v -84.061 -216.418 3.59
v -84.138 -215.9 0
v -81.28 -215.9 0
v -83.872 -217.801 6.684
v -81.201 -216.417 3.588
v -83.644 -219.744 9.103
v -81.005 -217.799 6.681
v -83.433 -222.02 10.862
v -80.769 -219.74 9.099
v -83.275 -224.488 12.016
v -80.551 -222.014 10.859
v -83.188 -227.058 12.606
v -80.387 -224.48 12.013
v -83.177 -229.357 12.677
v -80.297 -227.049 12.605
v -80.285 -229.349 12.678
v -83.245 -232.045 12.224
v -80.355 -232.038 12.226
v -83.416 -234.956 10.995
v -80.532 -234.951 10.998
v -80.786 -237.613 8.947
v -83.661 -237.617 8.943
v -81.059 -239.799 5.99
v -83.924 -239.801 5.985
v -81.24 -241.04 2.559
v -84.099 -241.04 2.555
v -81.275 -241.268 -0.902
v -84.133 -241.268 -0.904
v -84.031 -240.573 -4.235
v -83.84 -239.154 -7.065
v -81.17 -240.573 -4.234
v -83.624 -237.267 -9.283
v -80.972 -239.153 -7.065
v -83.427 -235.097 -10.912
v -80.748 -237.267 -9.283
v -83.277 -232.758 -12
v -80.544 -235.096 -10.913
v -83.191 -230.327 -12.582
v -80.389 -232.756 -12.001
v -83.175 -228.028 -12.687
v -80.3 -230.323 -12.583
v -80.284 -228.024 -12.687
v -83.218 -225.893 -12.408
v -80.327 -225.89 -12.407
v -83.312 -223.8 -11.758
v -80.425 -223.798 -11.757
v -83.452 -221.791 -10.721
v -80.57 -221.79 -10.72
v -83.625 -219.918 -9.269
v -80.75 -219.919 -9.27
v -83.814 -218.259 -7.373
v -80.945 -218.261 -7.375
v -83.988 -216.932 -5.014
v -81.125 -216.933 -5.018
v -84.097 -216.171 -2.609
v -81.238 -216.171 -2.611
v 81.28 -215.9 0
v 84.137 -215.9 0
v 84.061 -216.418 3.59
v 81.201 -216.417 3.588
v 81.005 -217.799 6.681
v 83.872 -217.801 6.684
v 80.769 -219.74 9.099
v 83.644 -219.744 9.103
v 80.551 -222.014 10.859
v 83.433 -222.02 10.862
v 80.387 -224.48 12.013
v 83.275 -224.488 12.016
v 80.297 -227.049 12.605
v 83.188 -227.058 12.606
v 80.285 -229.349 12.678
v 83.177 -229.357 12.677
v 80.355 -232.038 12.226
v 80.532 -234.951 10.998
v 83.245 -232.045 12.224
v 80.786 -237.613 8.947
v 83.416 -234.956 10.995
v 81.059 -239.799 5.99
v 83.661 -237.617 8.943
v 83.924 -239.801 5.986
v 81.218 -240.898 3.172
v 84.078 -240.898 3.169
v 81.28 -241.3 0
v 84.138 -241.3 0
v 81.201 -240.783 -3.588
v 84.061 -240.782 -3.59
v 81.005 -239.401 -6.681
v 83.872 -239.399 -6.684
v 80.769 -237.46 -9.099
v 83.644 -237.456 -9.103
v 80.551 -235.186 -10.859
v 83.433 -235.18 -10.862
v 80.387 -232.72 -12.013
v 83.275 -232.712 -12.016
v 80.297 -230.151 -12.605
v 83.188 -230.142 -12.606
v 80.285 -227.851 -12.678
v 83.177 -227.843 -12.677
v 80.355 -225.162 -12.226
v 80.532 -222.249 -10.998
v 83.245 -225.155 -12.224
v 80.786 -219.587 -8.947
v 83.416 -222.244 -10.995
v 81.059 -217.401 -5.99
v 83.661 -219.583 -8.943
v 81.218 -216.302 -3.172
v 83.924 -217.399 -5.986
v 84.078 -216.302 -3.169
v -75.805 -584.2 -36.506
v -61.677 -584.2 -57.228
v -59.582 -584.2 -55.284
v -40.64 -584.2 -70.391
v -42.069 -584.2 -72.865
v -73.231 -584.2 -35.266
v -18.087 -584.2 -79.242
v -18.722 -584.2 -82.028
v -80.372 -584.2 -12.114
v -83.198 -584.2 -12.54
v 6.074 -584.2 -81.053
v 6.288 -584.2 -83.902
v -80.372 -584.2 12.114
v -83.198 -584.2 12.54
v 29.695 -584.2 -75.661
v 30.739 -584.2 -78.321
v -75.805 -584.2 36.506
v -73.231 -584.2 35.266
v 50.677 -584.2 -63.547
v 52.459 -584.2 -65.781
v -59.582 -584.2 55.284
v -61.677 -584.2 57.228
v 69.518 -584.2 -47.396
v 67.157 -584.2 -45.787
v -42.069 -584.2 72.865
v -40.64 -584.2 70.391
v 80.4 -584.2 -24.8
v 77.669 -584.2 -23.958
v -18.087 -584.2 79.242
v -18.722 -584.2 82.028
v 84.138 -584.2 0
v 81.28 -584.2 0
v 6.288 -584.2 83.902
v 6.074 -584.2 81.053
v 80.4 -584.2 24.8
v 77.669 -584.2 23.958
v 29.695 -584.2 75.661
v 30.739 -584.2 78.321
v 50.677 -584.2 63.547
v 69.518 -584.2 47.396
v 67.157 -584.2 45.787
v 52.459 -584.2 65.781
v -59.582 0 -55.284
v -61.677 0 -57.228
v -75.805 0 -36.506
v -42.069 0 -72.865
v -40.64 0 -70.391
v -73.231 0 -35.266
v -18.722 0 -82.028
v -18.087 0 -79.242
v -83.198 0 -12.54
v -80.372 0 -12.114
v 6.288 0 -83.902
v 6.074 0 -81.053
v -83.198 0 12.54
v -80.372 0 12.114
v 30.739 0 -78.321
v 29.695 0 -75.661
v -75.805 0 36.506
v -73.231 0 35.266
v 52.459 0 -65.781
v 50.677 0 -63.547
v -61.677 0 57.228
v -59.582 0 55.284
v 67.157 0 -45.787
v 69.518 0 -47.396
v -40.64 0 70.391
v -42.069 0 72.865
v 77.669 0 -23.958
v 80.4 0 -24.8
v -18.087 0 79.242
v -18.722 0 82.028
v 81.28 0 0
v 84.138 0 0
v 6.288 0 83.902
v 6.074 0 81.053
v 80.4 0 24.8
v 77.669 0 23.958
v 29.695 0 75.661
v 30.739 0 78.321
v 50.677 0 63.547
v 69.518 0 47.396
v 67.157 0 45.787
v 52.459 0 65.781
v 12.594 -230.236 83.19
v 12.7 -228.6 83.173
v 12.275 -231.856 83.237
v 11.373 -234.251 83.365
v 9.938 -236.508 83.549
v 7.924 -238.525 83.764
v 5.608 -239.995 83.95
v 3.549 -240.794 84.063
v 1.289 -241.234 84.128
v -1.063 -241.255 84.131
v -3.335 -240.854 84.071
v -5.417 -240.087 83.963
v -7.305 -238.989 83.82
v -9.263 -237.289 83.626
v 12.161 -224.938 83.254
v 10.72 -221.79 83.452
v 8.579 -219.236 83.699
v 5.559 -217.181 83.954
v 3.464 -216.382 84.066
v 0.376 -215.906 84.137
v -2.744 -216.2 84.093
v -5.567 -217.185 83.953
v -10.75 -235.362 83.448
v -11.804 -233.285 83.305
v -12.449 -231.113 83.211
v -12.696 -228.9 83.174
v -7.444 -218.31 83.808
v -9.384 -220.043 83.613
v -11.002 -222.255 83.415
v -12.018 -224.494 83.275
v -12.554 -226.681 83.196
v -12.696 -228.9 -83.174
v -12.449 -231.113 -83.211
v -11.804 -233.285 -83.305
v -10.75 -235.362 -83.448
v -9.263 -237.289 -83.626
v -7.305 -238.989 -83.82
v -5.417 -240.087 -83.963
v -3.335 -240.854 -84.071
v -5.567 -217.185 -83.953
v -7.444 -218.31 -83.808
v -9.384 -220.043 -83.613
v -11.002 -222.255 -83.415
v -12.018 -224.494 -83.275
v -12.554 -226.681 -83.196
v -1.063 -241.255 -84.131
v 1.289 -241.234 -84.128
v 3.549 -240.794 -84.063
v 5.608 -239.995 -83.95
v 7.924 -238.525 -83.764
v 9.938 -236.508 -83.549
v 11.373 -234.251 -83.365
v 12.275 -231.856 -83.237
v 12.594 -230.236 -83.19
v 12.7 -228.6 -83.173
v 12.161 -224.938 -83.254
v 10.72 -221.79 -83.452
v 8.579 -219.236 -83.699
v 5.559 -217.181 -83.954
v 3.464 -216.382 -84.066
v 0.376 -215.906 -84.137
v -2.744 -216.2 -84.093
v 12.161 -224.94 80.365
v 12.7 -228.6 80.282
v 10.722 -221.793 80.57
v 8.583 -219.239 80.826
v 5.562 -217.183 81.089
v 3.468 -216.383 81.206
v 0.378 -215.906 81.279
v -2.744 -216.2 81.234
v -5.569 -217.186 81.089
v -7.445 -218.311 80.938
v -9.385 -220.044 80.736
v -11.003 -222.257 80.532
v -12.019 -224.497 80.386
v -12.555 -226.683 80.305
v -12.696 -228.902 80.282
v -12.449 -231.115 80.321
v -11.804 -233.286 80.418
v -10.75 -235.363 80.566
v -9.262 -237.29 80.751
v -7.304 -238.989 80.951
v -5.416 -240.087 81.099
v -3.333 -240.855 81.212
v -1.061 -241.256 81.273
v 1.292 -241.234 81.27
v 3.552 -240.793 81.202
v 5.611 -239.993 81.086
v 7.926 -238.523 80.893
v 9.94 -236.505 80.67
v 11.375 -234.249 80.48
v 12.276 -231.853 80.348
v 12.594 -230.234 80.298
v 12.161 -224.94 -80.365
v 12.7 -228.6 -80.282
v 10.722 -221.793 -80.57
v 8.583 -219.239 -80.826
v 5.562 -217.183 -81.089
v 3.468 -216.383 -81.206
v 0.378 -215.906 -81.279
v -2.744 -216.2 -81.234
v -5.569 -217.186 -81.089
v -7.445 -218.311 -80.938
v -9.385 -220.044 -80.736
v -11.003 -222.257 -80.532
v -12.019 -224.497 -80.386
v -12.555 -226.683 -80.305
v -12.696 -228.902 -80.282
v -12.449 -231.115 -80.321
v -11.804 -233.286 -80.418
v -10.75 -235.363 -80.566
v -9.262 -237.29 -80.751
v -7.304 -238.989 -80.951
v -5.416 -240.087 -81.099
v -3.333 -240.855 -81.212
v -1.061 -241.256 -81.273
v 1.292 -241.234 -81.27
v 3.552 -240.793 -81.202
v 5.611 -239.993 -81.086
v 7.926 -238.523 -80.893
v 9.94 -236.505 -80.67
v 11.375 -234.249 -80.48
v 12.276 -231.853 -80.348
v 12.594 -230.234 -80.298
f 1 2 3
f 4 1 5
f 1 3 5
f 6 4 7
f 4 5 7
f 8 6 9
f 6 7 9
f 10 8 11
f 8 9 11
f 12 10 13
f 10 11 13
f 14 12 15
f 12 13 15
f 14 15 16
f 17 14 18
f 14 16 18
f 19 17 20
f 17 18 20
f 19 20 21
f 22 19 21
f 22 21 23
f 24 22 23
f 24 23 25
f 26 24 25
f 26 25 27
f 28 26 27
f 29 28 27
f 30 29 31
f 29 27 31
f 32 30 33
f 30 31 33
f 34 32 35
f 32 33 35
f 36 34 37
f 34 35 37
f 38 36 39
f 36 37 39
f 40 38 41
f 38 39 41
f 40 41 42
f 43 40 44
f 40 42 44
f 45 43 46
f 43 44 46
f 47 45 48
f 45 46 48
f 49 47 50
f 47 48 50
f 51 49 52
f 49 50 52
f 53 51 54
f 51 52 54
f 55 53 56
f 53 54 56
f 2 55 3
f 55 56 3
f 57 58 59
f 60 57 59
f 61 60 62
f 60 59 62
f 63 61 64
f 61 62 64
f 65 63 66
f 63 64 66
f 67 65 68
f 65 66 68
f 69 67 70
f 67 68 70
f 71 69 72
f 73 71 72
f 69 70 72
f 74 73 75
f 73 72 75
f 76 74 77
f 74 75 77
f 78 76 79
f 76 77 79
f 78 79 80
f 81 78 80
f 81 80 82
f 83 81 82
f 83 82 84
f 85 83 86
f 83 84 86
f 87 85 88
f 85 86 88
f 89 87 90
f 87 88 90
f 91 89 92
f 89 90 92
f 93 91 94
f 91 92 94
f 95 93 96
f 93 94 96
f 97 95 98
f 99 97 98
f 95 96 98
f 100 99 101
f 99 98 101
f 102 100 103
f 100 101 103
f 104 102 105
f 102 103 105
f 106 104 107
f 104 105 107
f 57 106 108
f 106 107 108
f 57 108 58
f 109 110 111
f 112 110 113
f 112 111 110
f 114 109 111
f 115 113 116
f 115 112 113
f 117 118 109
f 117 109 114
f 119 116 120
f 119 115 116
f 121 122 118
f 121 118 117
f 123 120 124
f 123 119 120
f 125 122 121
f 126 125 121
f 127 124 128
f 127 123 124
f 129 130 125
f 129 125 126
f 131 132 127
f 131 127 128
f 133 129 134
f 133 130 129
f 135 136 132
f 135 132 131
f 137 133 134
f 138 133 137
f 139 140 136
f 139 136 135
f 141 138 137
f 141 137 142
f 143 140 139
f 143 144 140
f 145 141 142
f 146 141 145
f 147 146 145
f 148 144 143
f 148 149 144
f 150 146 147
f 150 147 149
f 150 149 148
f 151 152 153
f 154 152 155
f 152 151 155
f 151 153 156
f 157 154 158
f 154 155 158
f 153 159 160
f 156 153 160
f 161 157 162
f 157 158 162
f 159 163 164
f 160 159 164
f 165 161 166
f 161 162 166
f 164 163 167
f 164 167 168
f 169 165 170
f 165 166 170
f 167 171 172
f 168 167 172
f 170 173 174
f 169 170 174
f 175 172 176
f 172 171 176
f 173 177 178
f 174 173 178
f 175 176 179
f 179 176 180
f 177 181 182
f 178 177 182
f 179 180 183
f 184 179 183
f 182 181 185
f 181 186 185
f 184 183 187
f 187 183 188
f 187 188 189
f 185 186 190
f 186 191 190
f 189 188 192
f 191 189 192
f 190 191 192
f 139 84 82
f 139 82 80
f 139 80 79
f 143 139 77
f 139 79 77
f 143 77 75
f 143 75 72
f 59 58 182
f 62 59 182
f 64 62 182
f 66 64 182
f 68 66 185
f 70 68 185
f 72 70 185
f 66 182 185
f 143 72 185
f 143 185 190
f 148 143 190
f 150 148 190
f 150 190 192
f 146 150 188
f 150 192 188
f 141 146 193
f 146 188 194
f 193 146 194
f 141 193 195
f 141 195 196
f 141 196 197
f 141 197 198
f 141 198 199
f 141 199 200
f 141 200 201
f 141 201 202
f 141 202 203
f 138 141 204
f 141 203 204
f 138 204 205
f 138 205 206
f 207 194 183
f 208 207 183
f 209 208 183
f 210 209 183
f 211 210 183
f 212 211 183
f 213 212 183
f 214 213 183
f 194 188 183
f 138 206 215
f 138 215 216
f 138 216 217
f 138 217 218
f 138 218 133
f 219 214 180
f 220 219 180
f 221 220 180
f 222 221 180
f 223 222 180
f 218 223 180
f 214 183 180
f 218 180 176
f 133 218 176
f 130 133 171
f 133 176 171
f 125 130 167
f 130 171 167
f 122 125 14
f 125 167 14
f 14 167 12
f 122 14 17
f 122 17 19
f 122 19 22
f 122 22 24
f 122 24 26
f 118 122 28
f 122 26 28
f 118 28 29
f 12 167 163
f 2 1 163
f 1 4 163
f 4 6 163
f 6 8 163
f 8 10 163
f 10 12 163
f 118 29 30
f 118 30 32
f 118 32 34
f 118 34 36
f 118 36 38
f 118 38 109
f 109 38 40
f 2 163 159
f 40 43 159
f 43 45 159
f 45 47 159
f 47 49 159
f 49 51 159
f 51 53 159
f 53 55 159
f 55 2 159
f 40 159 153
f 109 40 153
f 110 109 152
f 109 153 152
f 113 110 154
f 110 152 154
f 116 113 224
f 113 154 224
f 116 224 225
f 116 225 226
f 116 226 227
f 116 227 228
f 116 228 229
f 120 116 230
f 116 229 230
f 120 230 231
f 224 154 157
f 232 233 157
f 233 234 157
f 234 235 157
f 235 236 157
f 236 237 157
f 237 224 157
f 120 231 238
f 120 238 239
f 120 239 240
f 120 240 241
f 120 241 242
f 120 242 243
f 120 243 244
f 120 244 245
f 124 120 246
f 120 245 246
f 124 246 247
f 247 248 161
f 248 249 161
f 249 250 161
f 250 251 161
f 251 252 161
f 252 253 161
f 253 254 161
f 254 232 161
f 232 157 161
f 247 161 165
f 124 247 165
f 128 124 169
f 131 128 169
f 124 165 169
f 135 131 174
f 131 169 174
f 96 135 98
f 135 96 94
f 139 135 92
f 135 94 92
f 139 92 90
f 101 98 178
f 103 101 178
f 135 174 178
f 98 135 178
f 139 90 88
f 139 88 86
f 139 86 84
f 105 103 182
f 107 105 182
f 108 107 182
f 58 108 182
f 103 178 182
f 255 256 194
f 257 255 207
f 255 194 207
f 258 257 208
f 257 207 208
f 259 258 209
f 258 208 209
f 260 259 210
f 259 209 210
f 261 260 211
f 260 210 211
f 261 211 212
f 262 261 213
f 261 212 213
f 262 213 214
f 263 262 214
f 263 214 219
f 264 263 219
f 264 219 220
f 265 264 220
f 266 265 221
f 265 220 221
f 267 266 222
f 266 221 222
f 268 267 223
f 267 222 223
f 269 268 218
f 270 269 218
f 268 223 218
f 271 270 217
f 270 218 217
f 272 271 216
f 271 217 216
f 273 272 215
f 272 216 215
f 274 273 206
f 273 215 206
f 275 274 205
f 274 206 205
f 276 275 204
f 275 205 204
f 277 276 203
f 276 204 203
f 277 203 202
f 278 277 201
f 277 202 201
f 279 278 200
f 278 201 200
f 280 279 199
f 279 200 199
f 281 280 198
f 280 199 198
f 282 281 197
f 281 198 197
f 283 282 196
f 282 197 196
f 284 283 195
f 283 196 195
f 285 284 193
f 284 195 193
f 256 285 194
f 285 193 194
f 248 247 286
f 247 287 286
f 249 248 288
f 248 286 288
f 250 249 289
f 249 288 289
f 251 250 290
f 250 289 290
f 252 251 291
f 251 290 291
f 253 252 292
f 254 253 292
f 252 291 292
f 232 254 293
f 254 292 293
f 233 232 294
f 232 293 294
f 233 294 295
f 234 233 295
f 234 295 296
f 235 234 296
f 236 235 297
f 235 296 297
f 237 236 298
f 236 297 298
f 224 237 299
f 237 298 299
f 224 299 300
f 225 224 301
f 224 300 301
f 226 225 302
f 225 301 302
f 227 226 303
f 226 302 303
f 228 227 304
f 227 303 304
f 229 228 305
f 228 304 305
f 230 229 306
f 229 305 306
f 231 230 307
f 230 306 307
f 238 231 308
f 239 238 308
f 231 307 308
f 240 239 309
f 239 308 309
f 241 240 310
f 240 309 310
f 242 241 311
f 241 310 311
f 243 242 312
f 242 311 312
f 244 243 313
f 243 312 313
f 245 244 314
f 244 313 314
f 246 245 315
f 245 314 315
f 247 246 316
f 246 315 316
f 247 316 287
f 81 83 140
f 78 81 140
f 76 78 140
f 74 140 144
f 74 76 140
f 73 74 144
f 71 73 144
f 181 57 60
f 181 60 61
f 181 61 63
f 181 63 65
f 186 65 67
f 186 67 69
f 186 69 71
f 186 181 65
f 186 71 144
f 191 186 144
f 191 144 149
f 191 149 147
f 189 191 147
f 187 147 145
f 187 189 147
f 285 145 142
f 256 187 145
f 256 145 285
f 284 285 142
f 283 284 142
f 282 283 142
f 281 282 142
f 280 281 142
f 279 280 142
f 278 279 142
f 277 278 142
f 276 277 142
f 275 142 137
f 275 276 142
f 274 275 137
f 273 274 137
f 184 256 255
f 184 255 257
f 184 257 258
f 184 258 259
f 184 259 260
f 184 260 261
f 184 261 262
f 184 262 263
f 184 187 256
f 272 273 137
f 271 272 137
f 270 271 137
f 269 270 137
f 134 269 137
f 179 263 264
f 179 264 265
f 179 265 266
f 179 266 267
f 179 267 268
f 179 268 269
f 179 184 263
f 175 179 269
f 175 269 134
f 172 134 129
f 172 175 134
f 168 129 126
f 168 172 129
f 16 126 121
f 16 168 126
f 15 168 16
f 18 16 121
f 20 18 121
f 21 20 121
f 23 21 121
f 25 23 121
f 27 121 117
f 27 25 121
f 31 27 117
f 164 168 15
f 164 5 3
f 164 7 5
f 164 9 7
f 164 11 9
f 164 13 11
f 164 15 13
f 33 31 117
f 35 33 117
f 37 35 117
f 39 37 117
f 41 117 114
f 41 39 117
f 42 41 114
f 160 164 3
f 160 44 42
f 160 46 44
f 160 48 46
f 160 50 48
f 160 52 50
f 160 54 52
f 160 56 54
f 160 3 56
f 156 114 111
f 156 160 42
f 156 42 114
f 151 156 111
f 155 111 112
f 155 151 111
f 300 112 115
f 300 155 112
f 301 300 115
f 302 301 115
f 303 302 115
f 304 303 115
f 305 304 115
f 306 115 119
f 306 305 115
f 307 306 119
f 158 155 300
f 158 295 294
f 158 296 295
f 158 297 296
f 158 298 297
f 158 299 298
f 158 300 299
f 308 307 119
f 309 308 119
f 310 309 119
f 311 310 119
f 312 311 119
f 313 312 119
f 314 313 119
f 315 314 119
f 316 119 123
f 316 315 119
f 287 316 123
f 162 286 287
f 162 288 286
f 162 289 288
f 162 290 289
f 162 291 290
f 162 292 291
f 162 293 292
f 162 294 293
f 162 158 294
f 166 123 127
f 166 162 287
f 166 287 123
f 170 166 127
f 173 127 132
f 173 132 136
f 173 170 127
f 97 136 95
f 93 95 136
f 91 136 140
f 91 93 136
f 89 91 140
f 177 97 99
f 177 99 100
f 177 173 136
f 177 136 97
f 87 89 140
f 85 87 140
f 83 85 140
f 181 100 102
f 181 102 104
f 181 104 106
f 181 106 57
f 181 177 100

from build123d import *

# Parameters (mm, degrees)
F0_R     = 84.1375
F0_R_2   = 81.28
F1_DEPTH = 457.2
F2_R     = 12.7
F3_DEPTH = 127
F4_R     = 12.7
F5_DEPTH = 127
F6_R     = 84.1375
F6_R_2   = 81.28
F7_DEPTH = 127


with BuildPart() as f1:
    # F0 (on Front) → F1 (new body)
    with BuildSketch(Plane.XZ):
        Circle(F0_R)
        Circle(F0_R_2, mode=Mode.SUBTRACT)
    extrude(amount=F1_DEPTH)

    # F2 (on Right) → F3 (cut, symmetric)
    with BuildSketch(Plane.YZ):
        with Locations((-228.6, 0)):
            Circle(F2_R)
    extrude(amount=F3_DEPTH, both=True, mode=Mode.SUBTRACT)

    # F4 (on Top) → F5 (cut, symmetric)
    with BuildSketch(Plane.XY):
        with Locations((0, -228.6)):
            Circle(F4_R)
    extrude(amount=F5_DEPTH, both=True, mode=Mode.SUBTRACT)

    # F6 (on face) → F7 (join)
    with BuildSketch(Plane.XZ.offset(457.2)):
        Circle(F6_R)
        Circle(F6_R_2, mode=Mode.SUBTRACT)
    extrude(amount=F7_DEPTH)


solid = f1.part
